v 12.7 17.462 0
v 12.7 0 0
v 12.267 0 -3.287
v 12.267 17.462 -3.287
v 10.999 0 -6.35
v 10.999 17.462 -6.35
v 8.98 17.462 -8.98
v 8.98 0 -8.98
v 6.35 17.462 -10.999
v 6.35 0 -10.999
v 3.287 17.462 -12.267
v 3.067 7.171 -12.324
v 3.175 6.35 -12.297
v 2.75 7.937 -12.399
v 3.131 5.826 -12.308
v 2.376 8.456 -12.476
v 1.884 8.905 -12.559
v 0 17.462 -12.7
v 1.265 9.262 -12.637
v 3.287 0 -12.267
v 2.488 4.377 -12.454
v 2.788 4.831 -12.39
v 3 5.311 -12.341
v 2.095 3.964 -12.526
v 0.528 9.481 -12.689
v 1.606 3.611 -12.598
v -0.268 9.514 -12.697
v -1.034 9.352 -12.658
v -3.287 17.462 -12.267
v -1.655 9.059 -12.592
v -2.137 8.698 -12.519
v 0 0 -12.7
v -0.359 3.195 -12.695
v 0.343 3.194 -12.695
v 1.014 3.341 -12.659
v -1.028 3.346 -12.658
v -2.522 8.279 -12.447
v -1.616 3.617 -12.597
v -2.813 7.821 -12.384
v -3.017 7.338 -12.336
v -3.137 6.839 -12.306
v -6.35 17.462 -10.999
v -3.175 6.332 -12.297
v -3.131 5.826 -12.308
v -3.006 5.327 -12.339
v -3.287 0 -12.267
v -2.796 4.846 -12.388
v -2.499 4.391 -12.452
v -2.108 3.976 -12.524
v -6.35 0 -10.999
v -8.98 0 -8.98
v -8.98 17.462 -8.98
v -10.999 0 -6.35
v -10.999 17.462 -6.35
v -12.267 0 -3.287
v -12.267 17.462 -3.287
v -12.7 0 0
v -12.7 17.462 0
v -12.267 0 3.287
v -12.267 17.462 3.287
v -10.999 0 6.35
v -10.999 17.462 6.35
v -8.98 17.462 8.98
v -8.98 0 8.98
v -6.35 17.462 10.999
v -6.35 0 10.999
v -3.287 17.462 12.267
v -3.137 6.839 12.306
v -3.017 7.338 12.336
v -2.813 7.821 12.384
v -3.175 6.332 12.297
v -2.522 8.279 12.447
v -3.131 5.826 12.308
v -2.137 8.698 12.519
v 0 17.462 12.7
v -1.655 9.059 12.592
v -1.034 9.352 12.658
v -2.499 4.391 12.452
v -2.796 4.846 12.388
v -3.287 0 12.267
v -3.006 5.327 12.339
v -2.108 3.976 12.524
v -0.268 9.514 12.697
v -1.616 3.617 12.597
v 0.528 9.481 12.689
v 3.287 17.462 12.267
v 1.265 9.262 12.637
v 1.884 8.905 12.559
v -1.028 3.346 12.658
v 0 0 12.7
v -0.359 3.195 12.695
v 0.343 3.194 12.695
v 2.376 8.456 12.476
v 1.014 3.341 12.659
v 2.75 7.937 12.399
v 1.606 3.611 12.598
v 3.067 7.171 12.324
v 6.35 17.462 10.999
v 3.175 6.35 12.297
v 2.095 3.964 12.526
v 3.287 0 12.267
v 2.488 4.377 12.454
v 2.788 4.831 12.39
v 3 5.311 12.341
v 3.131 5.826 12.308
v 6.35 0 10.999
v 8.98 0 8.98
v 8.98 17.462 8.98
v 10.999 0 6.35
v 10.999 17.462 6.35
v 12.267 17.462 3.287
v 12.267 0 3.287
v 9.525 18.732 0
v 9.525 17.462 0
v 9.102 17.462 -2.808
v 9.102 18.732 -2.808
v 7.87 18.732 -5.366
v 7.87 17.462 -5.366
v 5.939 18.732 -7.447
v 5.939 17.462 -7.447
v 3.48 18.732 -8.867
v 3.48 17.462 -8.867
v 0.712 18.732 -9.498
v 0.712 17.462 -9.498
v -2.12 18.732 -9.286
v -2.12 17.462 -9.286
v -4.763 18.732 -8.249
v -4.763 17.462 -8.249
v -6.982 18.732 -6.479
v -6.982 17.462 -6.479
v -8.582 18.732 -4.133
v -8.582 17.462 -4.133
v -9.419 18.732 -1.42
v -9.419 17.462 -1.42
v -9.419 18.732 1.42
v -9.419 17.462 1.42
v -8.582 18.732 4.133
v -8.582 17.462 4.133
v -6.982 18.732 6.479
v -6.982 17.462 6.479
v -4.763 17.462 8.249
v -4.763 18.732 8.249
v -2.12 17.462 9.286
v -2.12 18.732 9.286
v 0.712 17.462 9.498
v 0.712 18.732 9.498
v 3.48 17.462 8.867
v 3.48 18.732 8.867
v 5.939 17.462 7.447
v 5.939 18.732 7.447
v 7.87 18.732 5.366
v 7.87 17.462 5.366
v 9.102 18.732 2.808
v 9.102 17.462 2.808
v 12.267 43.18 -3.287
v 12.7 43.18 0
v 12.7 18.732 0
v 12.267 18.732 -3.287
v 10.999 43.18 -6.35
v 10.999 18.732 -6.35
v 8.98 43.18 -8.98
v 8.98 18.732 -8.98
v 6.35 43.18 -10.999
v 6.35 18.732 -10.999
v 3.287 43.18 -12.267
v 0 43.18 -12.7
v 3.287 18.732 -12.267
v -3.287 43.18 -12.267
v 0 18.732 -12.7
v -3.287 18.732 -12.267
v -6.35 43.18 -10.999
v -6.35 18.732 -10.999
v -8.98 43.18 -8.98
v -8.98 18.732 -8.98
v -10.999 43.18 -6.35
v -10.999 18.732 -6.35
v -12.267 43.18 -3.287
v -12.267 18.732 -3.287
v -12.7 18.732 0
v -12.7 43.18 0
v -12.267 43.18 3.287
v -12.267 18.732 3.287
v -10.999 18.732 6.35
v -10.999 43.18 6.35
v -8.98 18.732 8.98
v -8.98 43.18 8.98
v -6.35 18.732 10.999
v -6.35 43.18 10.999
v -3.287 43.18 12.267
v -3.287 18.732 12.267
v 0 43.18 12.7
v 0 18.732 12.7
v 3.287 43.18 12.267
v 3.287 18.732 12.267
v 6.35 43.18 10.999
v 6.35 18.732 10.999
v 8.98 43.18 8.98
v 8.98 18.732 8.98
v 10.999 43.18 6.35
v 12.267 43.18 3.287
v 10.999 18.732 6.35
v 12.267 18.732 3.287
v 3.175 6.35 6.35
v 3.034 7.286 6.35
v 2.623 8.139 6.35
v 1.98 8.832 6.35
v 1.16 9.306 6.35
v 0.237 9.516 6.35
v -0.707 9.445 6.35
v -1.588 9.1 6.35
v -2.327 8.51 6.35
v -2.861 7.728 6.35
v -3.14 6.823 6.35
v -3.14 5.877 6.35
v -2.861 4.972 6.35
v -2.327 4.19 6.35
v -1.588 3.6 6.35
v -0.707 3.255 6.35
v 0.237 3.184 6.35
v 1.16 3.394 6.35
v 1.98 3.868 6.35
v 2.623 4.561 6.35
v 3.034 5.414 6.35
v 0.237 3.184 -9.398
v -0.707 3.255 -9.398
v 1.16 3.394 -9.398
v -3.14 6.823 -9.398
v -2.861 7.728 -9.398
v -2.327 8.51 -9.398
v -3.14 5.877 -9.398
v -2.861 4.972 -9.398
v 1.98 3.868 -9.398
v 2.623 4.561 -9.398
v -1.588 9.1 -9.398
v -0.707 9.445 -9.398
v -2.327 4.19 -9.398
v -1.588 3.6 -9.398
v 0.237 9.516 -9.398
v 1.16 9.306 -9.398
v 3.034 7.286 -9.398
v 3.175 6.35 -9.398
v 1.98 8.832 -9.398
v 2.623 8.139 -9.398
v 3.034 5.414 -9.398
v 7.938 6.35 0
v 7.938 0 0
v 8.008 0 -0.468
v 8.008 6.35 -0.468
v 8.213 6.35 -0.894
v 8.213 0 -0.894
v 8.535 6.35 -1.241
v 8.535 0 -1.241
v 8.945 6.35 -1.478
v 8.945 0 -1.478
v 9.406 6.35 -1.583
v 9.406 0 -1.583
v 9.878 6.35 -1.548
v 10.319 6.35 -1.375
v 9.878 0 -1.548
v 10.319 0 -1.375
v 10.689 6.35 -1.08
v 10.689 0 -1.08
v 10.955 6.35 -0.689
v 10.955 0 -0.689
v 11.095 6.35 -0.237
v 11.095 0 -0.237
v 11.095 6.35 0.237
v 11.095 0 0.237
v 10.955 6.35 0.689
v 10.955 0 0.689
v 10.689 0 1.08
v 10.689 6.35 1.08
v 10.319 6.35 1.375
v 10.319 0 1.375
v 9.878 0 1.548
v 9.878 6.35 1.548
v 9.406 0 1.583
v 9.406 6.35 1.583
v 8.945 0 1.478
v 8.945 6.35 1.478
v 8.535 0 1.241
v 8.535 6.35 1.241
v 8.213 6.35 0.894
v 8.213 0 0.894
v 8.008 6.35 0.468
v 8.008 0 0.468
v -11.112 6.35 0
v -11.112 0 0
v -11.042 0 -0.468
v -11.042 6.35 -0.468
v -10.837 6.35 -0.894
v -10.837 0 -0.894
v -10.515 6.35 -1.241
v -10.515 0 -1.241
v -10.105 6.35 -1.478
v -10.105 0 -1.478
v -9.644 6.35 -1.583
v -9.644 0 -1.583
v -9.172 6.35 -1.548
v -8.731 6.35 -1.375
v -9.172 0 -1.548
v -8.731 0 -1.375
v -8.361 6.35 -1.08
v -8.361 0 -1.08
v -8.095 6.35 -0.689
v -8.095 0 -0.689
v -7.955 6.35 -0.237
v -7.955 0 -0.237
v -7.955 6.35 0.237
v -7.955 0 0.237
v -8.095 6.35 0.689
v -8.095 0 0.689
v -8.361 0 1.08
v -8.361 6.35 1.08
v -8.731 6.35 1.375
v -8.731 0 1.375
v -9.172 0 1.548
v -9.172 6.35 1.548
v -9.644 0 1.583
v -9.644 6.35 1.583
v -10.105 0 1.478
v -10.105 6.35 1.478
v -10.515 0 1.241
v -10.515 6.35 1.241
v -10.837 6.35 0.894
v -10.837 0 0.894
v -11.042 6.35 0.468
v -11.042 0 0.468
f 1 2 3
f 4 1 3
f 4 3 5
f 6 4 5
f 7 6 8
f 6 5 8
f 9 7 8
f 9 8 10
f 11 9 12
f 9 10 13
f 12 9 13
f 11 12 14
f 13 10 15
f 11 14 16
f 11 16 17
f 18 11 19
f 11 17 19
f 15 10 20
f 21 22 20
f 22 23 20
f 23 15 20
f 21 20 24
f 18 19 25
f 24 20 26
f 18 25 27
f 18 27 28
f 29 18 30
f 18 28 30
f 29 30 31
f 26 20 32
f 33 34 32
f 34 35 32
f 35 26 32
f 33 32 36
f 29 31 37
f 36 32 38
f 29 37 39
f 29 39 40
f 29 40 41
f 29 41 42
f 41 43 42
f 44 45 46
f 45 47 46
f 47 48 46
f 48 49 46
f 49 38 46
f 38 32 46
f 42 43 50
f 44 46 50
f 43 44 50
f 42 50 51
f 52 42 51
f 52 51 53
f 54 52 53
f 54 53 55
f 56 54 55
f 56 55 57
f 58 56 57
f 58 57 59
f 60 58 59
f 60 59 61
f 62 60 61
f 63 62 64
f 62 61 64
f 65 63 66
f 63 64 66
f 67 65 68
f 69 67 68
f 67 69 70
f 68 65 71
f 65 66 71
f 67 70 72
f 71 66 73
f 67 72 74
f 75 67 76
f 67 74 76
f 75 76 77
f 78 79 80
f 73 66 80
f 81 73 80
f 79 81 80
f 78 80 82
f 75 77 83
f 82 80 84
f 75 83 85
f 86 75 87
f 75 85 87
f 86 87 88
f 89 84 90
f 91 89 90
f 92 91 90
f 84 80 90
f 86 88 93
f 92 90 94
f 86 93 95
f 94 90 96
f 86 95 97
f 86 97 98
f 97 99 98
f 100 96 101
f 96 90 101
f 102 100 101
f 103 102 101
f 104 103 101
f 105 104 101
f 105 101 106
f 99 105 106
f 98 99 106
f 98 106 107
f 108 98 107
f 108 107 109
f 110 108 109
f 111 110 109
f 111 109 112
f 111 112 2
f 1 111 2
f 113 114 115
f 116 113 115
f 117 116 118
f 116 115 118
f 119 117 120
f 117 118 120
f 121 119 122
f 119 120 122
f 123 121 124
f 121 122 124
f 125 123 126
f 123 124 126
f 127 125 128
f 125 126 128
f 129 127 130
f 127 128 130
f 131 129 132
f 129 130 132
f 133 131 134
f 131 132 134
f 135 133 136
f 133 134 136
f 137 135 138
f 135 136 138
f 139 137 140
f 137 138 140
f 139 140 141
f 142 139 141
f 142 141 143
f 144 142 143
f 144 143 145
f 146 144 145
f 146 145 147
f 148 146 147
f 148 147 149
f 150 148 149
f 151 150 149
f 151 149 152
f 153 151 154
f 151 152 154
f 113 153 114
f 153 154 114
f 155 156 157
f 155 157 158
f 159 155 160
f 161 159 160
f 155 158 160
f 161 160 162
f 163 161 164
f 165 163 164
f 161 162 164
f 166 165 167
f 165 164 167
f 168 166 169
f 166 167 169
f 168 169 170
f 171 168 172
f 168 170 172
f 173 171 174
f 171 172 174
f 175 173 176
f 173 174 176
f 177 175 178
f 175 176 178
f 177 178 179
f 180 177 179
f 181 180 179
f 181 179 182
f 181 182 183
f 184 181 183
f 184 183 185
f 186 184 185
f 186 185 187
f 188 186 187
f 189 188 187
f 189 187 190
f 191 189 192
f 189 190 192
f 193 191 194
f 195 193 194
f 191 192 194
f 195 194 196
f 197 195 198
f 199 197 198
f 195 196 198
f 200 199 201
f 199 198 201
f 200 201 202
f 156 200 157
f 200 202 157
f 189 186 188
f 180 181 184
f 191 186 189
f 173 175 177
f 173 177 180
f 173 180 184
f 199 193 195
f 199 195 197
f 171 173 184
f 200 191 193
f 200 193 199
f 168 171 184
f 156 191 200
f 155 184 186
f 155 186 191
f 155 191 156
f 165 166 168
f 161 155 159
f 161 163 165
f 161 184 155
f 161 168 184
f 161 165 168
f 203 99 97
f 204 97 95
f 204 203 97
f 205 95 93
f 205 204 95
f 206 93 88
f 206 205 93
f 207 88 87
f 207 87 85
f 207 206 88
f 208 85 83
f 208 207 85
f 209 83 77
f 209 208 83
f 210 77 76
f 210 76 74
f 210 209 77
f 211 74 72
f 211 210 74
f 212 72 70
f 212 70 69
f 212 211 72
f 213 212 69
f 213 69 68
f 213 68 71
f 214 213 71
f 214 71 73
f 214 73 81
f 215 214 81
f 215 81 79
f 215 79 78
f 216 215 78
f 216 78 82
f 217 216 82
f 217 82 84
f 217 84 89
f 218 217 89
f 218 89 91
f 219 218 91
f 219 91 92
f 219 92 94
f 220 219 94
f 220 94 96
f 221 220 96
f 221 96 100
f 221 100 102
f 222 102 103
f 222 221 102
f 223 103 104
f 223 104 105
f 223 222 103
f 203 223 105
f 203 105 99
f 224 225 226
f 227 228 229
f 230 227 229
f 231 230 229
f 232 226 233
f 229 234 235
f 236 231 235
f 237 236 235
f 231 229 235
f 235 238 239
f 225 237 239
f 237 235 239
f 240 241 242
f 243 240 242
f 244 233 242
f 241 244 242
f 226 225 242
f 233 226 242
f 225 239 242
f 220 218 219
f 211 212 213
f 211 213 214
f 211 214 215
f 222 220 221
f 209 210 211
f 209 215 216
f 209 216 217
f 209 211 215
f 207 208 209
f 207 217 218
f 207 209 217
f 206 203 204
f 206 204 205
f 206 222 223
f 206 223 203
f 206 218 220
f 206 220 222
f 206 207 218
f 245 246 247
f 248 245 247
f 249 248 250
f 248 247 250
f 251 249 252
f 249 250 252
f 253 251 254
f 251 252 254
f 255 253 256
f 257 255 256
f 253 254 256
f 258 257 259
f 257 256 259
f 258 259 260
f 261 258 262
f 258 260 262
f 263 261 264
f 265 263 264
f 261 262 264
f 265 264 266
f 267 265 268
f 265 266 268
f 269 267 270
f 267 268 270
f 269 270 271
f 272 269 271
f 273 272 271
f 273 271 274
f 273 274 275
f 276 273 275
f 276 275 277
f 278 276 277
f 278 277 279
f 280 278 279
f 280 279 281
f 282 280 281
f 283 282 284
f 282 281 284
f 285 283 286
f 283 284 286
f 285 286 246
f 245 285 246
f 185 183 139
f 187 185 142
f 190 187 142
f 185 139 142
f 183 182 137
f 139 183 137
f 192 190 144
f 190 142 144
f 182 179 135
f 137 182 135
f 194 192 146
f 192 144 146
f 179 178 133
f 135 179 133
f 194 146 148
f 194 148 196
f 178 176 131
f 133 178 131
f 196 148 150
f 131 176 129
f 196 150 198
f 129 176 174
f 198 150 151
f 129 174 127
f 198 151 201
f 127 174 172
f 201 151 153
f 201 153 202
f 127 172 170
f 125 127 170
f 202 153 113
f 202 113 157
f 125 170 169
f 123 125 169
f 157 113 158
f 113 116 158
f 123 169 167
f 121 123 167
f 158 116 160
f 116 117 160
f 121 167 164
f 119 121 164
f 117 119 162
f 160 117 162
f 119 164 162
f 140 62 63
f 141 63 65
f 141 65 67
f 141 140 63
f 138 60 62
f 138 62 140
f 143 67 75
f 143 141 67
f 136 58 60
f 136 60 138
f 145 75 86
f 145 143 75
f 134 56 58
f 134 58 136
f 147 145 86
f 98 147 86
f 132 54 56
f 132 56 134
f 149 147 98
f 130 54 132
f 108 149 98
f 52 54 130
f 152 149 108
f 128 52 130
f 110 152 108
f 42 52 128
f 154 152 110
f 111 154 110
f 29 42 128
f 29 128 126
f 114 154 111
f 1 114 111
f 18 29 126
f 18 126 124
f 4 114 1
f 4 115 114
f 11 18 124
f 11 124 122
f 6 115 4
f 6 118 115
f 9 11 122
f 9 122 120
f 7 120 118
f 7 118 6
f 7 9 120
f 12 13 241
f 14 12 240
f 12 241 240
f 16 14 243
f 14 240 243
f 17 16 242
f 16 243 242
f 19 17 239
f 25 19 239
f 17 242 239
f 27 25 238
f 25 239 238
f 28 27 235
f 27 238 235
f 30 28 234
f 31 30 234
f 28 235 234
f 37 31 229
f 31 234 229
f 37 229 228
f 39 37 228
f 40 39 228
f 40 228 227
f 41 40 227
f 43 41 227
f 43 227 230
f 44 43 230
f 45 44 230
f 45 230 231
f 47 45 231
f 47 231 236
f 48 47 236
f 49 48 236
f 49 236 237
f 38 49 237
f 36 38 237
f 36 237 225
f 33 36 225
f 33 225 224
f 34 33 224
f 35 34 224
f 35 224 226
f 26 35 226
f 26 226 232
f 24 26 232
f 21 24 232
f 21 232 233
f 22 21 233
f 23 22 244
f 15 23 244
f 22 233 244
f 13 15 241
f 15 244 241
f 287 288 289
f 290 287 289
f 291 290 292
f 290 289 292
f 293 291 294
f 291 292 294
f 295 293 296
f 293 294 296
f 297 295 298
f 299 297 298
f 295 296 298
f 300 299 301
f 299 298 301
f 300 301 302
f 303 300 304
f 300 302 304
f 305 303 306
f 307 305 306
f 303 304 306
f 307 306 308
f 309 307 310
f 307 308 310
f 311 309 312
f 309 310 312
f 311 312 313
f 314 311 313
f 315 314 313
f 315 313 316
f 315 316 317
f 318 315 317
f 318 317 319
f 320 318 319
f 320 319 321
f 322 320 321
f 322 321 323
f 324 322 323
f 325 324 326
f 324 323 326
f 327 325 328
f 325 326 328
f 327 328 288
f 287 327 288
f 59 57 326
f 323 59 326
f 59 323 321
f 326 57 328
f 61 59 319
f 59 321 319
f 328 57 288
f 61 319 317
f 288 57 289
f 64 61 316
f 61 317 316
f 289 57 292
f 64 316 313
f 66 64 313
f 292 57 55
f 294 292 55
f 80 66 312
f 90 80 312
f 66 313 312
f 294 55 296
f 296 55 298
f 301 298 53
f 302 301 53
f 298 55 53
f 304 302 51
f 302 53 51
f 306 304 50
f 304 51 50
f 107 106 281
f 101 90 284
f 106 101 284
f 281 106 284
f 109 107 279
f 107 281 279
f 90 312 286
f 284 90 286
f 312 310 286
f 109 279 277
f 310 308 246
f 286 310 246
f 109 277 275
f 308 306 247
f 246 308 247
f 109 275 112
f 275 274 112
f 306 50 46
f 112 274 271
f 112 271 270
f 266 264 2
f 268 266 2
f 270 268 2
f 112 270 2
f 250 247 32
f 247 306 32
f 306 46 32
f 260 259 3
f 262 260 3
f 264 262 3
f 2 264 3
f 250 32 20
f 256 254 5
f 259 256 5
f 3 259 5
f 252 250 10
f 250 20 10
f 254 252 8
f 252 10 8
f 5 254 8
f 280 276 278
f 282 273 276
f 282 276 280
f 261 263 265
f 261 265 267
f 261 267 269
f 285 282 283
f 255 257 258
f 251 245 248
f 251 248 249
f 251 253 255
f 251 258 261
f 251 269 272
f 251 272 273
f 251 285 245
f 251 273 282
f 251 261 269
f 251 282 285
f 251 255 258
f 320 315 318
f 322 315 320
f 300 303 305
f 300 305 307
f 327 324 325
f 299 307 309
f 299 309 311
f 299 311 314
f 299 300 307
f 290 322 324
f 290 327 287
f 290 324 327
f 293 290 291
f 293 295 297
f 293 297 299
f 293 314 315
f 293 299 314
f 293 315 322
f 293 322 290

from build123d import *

# Parameters (mm, degrees)
SKETCH1_R           = 12.7
BOSS_EXTRUDE1_DEPTH = 17.4625
SKETCH2_R           = 9.525
BOSS_EXTRUDE2_DEPTH = 1.27
SKETCH3_R           = 12.7
BOSS_EXTRUDE3_DEPTH = 24.4475
CUT_EXTRUDE1_REACH  = 21.05
CUT_EXTRUDE1_START  = 6.35
SKETCH4_R           = 3.175
CUT_EXTRUDE2_REACH  = 24.098
CUT_EXTRUDE2_START  = -9.398
SKETCH5_R           = 3.175
SKETCH6_R           = 1.5875
CUT_EXTRUDE3_DEPTH  = 6.35


with BuildPart() as part:
    # Sketch1 → Boss-Extrude1 (new body)
    with BuildSketch(Plane(origin=(0, 0, 0), x_dir=(1, 0, 0), z_dir=(0, 1, 0))):
        Circle(SKETCH1_R)
    extrude(amount=BOSS_EXTRUDE1_DEPTH)

    # Sketch2 → Boss-Extrude2 (add)
    with BuildSketch(Plane(origin=(0, 17.4625, 0), x_dir=(1, 0, 0), z_dir=(0, 1, 0))):
        Circle(SKETCH2_R)
    extrude(amount=BOSS_EXTRUDE2_DEPTH)

    # Sketch3 → Boss-Extrude3 (add)
    with BuildSketch(Plane(origin=(0, 18.7325, 0), x_dir=(1, 0, 0), z_dir=(0, 1, 0))):
        Circle(SKETCH3_R)
    extrude(amount=BOSS_EXTRUDE3_DEPTH)

    # Sketch4 → Cut-Extrude1 (cut, up to next)
    with BuildSketch(Plane.XY.offset(CUT_EXTRUDE1_START), mode=Mode.PRIVATE) as cut_extrude1_sk1:
        with Locations((0, 6.35)):
            Circle(SKETCH4_R)
    cut_extrude1_tool1 = extrude(cut_extrude1_sk1.sketch, amount=CUT_EXTRUDE1_REACH, mode=Mode.PRIVATE) & part.part
    add(cut_extrude1_tool1.solids().sort_by_distance((0, 6.35, 6.35))[0], mode=Mode.SUBTRACT)

    # Sketch5 → Cut-Extrude2 (cut, up to next)
    with BuildSketch(Plane.XY.offset(CUT_EXTRUDE2_START), mode=Mode.PRIVATE) as cut_extrude2_sk1:
        with Locations((0, 6.35)):
            Circle(SKETCH5_R)
    cut_extrude2_tool1 = extrude(cut_extrude2_sk1.sketch, amount=-CUT_EXTRUDE2_REACH, mode=Mode.PRIVATE) & part.part
    add(cut_extrude2_tool1.solids().sort_by_distance((0, 6.35, -9.398))[0], mode=Mode.SUBTRACT)

    # Sketch6 → Cut-Extrude3 (cut)
    with BuildSketch(Plane(origin=(0, 0, 0), x_dir=(-1, 0, 0), z_dir=(0, -1, 0))):
        with Locations((-9.525, 0)):
            Circle(SKETCH6_R)
        with Locations((9.525, 0)):
            Circle(SKETCH6_R)
    extrude(amount=-CUT_EXTRUDE3_DEPTH, mode=Mode.SUBTRACT)


solid = part.part
